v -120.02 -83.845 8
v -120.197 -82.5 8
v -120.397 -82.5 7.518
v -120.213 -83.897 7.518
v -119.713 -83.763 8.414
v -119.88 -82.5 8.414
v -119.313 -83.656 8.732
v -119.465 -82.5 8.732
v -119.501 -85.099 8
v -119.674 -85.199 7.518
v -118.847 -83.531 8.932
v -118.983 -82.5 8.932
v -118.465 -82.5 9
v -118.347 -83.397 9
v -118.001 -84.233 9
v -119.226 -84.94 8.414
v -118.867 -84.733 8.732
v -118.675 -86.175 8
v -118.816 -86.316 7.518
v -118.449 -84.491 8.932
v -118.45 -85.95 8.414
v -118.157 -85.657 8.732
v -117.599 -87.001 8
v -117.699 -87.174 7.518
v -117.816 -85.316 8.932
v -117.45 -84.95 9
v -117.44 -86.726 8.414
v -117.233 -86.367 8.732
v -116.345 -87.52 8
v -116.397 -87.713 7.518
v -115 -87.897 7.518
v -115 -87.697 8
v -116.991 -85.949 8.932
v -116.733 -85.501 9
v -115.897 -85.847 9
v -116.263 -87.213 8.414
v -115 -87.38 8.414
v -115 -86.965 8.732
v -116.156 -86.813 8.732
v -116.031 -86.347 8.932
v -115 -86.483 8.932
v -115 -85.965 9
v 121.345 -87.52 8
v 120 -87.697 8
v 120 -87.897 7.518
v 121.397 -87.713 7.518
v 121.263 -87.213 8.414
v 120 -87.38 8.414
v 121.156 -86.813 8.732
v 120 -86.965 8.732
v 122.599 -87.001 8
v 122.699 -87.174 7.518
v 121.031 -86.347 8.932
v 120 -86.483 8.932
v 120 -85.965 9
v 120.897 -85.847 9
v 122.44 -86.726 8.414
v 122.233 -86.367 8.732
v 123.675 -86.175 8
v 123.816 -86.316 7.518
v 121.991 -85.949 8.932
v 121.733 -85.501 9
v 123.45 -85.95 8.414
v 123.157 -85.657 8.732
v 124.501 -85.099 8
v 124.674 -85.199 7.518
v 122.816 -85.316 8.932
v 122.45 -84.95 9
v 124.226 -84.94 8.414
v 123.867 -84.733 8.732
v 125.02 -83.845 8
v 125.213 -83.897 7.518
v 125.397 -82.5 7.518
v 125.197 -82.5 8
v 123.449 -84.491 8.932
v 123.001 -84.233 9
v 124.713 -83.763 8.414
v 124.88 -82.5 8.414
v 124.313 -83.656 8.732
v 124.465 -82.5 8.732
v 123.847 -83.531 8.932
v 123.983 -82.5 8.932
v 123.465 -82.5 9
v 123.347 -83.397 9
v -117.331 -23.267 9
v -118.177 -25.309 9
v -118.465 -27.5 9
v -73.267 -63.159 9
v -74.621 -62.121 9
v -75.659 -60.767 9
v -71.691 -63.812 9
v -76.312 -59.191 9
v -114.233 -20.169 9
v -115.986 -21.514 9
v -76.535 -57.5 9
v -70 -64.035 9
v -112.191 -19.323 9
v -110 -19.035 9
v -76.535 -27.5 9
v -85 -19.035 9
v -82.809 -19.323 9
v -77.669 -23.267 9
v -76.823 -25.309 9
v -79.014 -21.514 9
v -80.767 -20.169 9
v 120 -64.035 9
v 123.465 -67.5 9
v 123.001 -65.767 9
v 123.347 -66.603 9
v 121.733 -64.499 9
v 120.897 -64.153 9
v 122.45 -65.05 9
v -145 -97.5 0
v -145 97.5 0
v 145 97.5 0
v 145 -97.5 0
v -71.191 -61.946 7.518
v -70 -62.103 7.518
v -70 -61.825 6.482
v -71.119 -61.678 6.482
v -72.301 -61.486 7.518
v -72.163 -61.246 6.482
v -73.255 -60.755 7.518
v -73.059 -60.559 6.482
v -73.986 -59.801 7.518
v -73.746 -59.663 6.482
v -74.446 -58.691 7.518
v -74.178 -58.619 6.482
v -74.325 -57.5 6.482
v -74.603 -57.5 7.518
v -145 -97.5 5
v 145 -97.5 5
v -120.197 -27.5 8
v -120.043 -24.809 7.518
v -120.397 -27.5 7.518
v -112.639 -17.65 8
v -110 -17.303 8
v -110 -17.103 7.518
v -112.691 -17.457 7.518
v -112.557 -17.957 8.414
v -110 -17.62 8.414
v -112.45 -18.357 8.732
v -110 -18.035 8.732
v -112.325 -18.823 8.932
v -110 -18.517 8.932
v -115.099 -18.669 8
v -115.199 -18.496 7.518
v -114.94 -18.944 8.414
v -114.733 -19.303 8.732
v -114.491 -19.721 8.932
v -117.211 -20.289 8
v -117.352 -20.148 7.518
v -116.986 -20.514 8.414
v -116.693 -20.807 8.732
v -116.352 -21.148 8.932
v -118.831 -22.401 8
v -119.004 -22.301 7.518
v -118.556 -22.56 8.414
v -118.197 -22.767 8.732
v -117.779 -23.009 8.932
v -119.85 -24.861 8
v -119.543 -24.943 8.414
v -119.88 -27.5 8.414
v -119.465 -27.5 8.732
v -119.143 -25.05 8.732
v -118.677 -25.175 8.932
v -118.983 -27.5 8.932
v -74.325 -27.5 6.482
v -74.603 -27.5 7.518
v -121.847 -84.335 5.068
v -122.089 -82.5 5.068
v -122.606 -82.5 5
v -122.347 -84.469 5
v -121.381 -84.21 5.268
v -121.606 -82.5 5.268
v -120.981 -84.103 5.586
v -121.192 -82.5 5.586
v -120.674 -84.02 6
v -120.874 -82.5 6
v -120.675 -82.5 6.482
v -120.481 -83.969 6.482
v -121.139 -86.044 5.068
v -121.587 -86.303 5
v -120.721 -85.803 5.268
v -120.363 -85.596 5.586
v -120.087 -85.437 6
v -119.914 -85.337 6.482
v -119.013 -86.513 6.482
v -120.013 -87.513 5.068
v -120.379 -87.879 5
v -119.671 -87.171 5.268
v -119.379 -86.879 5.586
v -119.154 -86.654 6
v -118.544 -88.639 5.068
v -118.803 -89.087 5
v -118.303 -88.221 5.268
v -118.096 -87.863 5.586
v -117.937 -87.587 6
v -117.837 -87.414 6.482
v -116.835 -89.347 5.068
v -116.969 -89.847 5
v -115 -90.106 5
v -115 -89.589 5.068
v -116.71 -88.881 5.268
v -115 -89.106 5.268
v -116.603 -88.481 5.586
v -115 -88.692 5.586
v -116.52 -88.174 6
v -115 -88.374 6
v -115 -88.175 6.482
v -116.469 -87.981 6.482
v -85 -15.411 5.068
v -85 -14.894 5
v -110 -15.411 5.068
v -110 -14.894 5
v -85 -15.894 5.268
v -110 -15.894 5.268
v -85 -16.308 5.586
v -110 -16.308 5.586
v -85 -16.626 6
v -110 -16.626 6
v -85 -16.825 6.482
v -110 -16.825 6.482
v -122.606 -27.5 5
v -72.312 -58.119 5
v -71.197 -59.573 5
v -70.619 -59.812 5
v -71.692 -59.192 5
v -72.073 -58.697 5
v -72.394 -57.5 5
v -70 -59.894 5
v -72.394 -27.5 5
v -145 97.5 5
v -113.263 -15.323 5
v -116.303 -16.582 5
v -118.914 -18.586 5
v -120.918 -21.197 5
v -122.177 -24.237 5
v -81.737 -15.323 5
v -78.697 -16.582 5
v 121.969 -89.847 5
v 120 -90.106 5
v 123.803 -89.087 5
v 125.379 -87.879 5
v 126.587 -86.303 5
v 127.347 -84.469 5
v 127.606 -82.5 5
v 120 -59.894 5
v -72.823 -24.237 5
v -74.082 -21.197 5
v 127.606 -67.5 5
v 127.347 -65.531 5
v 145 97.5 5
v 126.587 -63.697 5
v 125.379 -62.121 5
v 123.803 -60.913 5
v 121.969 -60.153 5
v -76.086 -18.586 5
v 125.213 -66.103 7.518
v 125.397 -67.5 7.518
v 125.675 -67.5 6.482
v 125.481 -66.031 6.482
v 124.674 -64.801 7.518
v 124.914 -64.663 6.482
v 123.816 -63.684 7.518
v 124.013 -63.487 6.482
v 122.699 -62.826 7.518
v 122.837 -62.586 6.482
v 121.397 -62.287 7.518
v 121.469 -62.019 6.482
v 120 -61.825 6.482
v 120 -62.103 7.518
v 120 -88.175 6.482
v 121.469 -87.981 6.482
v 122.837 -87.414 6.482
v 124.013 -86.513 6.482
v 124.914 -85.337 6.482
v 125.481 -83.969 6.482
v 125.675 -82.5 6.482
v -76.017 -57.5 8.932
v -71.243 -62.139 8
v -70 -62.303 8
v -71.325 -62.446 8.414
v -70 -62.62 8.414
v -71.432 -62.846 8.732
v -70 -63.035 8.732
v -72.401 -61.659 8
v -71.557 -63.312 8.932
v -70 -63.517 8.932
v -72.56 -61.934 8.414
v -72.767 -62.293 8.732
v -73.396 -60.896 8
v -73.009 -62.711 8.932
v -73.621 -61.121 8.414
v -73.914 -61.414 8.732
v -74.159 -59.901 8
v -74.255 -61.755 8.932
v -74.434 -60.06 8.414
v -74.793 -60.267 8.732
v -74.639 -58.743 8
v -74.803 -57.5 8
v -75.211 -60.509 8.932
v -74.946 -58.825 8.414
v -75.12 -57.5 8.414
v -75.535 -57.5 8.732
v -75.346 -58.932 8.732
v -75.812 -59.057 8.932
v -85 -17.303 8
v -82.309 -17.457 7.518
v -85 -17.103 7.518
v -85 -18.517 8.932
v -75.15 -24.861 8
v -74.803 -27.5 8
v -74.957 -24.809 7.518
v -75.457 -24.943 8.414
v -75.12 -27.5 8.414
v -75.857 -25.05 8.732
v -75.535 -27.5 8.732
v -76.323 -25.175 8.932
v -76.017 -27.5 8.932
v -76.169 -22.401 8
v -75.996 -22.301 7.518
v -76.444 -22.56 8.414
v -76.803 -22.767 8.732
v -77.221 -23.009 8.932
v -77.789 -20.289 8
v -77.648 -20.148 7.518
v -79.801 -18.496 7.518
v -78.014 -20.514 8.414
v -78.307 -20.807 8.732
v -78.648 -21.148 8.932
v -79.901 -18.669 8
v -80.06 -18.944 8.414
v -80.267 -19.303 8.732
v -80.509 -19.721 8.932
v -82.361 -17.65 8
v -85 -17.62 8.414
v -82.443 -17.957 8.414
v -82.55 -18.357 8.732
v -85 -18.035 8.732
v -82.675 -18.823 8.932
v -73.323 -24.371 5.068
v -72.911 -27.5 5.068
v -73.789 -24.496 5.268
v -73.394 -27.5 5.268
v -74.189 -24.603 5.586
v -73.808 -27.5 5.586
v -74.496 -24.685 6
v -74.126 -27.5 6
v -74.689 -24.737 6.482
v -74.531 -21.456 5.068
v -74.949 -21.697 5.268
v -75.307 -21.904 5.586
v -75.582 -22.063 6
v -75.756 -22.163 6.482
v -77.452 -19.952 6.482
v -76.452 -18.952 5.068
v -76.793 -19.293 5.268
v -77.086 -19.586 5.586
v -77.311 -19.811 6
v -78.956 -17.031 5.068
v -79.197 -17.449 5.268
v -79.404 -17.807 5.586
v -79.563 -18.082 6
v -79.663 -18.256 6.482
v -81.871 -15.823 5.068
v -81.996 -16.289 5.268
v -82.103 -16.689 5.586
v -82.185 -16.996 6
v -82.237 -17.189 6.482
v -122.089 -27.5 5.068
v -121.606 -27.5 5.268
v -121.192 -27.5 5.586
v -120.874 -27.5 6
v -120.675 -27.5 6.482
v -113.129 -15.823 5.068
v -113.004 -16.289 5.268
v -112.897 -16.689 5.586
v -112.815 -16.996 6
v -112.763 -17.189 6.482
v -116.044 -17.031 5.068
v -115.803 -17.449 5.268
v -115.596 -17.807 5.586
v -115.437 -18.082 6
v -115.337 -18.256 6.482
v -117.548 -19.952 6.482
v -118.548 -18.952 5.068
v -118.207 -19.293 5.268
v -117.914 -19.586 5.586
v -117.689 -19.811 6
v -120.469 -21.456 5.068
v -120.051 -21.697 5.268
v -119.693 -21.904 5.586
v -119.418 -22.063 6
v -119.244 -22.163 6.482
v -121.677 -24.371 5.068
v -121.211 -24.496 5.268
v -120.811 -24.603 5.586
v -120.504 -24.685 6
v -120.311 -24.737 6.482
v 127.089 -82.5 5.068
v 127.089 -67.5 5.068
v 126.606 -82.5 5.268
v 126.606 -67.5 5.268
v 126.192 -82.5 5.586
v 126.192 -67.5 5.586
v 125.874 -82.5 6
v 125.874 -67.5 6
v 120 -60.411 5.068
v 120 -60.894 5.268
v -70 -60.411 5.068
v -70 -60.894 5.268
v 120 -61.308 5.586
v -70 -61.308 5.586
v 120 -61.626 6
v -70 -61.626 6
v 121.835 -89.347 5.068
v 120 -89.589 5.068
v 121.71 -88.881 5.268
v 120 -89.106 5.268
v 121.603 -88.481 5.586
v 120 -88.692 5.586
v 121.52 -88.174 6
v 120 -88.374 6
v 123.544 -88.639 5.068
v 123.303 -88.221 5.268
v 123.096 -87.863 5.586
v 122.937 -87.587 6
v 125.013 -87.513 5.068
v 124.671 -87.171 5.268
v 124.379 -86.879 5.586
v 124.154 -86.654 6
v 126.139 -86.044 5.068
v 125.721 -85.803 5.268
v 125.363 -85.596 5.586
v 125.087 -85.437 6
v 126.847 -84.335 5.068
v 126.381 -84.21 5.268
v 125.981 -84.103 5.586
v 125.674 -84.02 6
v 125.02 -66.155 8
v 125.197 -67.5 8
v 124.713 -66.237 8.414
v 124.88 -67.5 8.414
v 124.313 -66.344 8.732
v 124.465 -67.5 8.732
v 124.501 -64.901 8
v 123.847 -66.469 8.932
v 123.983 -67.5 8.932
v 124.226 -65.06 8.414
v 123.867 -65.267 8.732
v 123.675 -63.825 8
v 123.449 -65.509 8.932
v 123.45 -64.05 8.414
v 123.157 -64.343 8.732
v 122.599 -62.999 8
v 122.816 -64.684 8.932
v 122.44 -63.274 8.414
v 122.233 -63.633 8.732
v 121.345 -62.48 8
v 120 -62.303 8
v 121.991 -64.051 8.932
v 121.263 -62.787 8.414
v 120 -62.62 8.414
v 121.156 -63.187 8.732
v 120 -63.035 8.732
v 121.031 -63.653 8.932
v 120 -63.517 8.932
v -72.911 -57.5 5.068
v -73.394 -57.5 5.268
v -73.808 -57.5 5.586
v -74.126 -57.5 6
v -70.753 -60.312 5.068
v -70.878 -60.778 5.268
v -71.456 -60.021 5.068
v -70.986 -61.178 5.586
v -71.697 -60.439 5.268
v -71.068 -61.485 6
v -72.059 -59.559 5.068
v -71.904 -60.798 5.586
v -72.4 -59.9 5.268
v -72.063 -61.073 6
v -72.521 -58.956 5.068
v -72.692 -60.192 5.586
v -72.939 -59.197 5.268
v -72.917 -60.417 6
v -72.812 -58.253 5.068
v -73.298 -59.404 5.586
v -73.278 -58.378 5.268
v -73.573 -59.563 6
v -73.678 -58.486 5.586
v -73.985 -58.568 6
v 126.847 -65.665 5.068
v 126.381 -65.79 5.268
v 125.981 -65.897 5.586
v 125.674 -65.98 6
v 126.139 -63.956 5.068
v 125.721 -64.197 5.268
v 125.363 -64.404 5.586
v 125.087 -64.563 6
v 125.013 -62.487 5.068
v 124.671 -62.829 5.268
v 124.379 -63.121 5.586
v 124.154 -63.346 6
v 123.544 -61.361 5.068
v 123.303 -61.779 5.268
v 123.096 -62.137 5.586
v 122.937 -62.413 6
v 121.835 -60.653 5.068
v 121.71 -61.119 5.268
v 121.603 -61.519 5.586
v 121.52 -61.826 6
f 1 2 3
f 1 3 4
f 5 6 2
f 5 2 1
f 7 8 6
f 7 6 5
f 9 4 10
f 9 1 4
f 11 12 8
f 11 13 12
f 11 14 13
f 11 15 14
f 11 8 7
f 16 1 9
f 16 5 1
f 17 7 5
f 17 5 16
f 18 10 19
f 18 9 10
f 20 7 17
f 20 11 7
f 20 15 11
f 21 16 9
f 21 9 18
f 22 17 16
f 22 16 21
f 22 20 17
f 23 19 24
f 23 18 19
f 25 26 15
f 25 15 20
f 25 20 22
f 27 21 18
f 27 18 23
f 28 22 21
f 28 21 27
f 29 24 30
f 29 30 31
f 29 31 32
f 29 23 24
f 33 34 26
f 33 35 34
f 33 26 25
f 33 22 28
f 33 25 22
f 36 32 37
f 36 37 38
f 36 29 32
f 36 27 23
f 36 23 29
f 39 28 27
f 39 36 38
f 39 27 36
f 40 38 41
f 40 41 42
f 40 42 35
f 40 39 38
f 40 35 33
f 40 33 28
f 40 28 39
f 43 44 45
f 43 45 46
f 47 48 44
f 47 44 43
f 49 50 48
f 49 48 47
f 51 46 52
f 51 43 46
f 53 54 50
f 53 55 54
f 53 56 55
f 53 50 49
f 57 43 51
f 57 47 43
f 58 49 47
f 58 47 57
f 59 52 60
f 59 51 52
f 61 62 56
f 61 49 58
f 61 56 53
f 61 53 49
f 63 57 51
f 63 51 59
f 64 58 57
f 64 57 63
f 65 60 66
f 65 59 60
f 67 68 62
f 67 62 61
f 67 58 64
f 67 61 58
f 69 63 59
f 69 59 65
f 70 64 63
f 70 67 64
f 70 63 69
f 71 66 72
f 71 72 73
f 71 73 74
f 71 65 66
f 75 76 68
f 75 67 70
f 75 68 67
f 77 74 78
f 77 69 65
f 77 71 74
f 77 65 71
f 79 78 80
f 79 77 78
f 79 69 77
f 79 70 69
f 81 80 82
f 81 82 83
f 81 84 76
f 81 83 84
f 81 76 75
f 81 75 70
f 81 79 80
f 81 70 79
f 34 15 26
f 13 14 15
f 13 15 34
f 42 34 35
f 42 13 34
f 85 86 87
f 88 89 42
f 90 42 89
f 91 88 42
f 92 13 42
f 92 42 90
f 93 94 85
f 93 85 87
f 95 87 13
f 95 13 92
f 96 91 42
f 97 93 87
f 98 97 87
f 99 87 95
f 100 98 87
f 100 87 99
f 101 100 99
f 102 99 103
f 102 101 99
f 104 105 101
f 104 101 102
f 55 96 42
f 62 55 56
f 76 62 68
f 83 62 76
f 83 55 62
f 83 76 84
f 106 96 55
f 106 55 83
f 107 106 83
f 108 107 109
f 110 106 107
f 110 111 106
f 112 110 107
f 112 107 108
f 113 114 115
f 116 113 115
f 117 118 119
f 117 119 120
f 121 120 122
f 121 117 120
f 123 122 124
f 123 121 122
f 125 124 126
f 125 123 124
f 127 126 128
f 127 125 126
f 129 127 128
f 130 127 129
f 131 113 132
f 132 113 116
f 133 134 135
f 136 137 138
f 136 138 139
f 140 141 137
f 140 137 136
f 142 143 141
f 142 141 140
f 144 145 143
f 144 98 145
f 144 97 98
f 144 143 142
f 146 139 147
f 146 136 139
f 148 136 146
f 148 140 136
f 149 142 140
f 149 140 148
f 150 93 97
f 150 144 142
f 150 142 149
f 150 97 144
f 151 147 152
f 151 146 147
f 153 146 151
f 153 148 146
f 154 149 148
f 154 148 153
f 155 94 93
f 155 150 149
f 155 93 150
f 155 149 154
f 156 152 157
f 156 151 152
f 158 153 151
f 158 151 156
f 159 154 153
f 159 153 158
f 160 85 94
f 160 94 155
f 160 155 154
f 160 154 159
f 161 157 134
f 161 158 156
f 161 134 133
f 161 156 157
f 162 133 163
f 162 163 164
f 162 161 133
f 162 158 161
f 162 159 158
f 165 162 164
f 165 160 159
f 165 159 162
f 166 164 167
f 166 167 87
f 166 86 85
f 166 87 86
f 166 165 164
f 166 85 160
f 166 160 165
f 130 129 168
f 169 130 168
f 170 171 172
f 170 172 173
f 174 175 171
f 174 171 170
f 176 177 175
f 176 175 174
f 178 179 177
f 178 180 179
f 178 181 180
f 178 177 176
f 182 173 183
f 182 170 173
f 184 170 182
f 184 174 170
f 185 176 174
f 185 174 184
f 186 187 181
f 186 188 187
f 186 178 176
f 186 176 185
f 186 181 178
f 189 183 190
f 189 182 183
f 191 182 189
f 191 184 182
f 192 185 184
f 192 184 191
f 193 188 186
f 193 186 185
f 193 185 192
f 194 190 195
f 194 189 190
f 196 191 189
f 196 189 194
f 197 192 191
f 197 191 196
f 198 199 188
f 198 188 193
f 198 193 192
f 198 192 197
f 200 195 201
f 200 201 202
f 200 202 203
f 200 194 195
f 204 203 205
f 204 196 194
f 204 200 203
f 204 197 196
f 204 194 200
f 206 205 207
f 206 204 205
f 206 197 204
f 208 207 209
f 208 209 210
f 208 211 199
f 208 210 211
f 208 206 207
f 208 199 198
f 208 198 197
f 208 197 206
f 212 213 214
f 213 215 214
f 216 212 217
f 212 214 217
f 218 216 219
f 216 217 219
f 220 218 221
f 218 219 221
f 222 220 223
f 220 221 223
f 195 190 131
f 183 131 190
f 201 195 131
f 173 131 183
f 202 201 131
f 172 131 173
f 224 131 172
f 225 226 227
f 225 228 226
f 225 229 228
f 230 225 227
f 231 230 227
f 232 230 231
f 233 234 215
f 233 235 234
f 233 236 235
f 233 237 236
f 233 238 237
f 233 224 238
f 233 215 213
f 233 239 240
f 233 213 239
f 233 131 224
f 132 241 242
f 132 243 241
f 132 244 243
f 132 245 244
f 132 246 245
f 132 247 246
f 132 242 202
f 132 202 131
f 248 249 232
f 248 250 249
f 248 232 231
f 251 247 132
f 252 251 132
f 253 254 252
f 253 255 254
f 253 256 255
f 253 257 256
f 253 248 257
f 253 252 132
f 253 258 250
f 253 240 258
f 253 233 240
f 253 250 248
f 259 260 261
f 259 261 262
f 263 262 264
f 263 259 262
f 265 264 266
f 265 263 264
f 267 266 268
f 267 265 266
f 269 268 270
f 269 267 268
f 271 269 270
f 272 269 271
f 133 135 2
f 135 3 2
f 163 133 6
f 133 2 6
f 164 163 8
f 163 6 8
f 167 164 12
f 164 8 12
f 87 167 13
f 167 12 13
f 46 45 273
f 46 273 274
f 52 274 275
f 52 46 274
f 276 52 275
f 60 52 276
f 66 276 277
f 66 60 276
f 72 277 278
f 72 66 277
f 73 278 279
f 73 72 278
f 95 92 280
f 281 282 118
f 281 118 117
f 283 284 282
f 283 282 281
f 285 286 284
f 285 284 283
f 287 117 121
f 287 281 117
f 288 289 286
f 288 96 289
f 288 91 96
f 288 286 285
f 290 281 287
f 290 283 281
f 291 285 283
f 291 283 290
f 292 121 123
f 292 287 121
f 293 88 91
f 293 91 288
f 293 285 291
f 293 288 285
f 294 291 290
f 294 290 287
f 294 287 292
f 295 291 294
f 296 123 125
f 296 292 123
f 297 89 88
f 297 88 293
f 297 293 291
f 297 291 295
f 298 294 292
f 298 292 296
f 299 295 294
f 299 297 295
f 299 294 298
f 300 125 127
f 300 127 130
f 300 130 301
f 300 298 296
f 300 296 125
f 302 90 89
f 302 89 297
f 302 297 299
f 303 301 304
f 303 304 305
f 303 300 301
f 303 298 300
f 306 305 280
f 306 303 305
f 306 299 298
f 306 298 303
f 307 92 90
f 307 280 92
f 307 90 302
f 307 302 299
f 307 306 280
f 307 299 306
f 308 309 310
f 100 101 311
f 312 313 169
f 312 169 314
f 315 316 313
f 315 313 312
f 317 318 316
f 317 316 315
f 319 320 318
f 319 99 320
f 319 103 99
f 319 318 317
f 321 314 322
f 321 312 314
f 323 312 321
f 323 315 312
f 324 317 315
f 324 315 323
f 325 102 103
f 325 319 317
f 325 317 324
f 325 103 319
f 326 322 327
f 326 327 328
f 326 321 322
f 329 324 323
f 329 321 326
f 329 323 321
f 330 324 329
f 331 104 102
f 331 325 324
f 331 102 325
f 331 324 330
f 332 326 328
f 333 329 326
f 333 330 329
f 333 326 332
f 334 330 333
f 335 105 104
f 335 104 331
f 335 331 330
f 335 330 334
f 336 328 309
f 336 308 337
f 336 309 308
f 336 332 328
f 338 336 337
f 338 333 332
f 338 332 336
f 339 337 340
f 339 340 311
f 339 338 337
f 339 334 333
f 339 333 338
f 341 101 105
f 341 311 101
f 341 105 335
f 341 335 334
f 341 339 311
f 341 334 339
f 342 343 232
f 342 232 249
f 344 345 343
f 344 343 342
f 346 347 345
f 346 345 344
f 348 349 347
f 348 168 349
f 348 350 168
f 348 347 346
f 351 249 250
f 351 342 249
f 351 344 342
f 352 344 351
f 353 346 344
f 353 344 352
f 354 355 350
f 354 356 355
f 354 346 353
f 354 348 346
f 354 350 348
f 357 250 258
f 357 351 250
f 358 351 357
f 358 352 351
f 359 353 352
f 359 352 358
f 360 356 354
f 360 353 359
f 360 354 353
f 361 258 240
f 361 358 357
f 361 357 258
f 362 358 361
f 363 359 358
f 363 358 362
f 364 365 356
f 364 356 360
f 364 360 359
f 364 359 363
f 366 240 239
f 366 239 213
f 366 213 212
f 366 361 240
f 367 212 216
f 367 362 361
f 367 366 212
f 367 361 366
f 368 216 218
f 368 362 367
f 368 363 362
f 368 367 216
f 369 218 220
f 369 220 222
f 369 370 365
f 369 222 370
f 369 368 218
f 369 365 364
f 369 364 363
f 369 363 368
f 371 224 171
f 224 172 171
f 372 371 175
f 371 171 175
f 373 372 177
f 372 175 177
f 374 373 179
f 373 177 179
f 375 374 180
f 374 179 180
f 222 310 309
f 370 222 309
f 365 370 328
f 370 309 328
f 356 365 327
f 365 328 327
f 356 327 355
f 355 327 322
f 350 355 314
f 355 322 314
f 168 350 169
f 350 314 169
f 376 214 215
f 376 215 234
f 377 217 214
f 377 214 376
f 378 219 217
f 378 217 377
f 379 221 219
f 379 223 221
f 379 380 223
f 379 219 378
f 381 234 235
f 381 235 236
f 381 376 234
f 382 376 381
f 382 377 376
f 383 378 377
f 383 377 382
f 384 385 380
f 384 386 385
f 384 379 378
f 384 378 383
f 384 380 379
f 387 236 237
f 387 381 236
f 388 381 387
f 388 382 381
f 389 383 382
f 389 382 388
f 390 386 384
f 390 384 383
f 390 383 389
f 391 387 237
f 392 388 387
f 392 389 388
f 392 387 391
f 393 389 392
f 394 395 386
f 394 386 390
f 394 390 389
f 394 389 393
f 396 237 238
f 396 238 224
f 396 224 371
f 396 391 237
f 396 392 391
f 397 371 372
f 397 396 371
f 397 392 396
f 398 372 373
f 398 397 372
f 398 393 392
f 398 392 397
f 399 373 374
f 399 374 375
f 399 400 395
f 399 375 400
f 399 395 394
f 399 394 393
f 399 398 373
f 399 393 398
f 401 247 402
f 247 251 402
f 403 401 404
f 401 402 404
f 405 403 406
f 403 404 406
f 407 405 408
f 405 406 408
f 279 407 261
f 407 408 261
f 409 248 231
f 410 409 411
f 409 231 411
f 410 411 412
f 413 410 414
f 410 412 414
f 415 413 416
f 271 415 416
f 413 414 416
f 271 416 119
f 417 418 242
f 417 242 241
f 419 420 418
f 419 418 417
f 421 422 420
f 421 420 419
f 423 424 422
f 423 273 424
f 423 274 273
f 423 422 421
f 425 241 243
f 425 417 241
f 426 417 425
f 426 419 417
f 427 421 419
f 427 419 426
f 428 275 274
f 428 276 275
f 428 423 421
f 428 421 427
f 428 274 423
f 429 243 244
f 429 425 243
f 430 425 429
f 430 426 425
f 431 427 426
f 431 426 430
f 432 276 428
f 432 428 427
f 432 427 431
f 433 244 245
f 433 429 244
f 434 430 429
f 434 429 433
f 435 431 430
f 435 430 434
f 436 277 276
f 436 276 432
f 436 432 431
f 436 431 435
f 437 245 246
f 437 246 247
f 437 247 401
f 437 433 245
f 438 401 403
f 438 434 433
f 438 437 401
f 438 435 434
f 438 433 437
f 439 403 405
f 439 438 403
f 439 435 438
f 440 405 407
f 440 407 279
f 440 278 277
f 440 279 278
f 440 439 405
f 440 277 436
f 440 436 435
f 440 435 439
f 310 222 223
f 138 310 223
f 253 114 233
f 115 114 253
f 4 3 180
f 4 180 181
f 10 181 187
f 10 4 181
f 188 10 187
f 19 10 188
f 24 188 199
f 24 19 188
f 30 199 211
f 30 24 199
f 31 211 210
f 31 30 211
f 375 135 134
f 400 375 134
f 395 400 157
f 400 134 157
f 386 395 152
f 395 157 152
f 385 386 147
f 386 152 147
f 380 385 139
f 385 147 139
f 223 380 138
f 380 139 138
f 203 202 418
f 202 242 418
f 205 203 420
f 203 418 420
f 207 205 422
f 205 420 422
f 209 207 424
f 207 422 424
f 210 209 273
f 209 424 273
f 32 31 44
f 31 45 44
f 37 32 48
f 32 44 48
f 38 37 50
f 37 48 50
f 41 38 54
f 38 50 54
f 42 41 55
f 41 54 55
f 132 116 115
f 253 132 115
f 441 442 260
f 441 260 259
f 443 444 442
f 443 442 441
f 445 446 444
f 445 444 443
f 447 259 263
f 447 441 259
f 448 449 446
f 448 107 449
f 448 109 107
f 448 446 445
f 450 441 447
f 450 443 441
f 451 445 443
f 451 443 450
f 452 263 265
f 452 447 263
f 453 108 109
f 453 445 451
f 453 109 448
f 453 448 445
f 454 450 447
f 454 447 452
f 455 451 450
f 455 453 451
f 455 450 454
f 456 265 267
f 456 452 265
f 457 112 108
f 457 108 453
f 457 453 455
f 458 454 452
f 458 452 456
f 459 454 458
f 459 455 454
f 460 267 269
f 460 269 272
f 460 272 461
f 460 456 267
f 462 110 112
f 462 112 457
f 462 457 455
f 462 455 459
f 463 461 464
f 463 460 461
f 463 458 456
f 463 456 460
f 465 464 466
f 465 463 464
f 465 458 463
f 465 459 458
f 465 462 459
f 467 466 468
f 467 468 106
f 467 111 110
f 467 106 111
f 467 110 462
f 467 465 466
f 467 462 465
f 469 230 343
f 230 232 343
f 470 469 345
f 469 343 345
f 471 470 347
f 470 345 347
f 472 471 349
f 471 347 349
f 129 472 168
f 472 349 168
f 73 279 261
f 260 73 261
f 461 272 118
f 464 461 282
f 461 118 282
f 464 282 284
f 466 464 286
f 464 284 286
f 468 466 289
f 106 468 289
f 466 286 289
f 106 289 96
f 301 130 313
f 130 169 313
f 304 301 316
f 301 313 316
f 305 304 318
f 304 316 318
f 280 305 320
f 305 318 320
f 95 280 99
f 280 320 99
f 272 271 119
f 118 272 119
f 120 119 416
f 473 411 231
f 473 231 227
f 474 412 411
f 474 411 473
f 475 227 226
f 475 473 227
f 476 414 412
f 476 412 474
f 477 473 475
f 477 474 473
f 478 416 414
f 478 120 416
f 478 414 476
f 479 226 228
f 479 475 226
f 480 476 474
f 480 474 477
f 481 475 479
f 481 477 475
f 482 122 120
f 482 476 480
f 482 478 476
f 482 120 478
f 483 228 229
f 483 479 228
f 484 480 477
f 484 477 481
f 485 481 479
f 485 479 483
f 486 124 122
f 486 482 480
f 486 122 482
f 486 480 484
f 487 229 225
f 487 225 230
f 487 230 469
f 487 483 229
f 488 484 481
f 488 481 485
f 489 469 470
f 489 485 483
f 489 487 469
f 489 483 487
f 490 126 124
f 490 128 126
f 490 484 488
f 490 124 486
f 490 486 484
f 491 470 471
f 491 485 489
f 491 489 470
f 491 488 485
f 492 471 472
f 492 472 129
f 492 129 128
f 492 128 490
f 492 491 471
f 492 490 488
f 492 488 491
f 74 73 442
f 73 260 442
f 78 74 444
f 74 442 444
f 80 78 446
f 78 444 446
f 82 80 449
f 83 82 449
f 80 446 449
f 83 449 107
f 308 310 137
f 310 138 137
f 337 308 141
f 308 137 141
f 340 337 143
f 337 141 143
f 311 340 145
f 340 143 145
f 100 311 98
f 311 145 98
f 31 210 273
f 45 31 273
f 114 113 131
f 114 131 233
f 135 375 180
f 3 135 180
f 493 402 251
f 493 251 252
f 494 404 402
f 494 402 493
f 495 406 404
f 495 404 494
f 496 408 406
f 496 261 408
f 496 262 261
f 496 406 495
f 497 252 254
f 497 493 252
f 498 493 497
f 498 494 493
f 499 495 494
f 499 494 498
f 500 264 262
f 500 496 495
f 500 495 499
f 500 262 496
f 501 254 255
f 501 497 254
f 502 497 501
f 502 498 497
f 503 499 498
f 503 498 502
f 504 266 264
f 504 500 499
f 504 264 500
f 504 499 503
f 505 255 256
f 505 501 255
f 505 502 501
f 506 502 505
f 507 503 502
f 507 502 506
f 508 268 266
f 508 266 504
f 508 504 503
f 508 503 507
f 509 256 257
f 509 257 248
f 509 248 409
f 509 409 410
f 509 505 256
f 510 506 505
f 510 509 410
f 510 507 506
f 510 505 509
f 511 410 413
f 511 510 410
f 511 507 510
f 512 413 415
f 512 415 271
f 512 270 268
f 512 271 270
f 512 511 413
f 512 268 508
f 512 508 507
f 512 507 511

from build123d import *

# Parameters (mm, degrees)
SKETCH_1_W      = 290
SKETCH_1_H      = 195
EXTRUDE_1_DEPTH = 5
EXTRUDE_2_DEPTH = 4
FILLET_1_R      = 5
FILLET_2_R      = 10
DRAFT_2_ANGLE   = 15
FILLET_3_R      = 2


with BuildPart() as part:
    # 草图1 → 凸台-拉伸1 (new body)
    with BuildSketch(Plane.XY):
        Rectangle(SKETCH_1_W, SKETCH_1_H)
    extrude(amount=EXTRUDE_1_DEPTH)

    # 草图2 → 凸台-拉伸2 (add)
    with BuildSketch(Plane.XY.offset(5)):
        Polygon((-75, -17.5), (-120, -17.5), (-120, -87.5), (125, -87.5), (125, -62.5), (-75, -62.5), align=None)
    extrude(amount=EXTRUDE_2_DEPTH)

    # 圆角1
    fillet_1_edges = [part.edges().sort_by_distance(p)[0] for p in [
        (-75, -62.5, 7),
        (-120, -87.5, 7),
        (125, -87.5, 7),
        (125, -62.5, 7),
    ]]
    fillet(fillet_1_edges, radius=FILLET_1_R)

    # 圆角2
    fillet_2_edges = [part.edges().sort_by_distance(p)[0] for p in [
        (-75, -17.5, 7),
        (-120, -17.5, 7),
    ]]
    fillet(fillet_2_edges, radius=FILLET_2_R)

    # 拔模2
    draft_2_faces = [part.faces().sort_by_distance(p)[0] for p in [
        (-73.535533906, -61.035533906, 7),
        (123.535533906, -63.964466094, 7),
        (123.535533906, -86.035533906, 7),
        (125, -75, 7),
        (25, -62.5, 7),
        (-75, -42.5, 7),
        (-77.928932188, -20.428932188, 7),
        (-97.5, -17.5, 7),
        (-117.071067812, -20.428932188, 7),
        (-120, -55, 7),
        (-118.535533906, -86.035533906, 7),
        (2.5, -87.5, 7),
    ]]
    draft(draft_2_faces, Plane.XY.offset(9), DRAFT_2_ANGLE)

    # 圆角3
    fillet_3_edges = [part.edges().sort_by_distance(p)[0] for p in [
        (25, -61.42820323, 5),
        (25, -62.5, 9),
        (126.07179677, -75, 5),
        (125, -75, 9),
        (-75, -42.5, 9),
        (2.5, -87.5, 9),
        (-118.535533906, -86.035533906, 9),
        (123.535533906, -86.035533906, 9),
        (123.535533906, -63.964466094, 9),
        (-73.92820323, -42.5, 5),
        (2.5, -88.57179677, 5),
        (-72.777659142, -60.277659142, 5),
        (124.29340867, -63.20659133, 5),
        (-73.535533906, -61.035533906, 9),
        (124.29340867, -86.79340867, 5),
        (-119.29340867, -86.79340867, 5),
        (-97.5, -16.42820323, 5),
        (-97.5, -17.5, 9),
        (-120, -55, 9),
        (-117.071067812, -20.428932188, 9),
        (-77.928932188, -20.428932188, 9),
        (-121.07179677, -55, 5),
        (-77.171057424, -19.671057424, 5),
        (-117.828942576, -19.671057424, 5),
    ]]
    fillet(fillet_3_edges, radius=FILLET_3_R)


solid = part.part
